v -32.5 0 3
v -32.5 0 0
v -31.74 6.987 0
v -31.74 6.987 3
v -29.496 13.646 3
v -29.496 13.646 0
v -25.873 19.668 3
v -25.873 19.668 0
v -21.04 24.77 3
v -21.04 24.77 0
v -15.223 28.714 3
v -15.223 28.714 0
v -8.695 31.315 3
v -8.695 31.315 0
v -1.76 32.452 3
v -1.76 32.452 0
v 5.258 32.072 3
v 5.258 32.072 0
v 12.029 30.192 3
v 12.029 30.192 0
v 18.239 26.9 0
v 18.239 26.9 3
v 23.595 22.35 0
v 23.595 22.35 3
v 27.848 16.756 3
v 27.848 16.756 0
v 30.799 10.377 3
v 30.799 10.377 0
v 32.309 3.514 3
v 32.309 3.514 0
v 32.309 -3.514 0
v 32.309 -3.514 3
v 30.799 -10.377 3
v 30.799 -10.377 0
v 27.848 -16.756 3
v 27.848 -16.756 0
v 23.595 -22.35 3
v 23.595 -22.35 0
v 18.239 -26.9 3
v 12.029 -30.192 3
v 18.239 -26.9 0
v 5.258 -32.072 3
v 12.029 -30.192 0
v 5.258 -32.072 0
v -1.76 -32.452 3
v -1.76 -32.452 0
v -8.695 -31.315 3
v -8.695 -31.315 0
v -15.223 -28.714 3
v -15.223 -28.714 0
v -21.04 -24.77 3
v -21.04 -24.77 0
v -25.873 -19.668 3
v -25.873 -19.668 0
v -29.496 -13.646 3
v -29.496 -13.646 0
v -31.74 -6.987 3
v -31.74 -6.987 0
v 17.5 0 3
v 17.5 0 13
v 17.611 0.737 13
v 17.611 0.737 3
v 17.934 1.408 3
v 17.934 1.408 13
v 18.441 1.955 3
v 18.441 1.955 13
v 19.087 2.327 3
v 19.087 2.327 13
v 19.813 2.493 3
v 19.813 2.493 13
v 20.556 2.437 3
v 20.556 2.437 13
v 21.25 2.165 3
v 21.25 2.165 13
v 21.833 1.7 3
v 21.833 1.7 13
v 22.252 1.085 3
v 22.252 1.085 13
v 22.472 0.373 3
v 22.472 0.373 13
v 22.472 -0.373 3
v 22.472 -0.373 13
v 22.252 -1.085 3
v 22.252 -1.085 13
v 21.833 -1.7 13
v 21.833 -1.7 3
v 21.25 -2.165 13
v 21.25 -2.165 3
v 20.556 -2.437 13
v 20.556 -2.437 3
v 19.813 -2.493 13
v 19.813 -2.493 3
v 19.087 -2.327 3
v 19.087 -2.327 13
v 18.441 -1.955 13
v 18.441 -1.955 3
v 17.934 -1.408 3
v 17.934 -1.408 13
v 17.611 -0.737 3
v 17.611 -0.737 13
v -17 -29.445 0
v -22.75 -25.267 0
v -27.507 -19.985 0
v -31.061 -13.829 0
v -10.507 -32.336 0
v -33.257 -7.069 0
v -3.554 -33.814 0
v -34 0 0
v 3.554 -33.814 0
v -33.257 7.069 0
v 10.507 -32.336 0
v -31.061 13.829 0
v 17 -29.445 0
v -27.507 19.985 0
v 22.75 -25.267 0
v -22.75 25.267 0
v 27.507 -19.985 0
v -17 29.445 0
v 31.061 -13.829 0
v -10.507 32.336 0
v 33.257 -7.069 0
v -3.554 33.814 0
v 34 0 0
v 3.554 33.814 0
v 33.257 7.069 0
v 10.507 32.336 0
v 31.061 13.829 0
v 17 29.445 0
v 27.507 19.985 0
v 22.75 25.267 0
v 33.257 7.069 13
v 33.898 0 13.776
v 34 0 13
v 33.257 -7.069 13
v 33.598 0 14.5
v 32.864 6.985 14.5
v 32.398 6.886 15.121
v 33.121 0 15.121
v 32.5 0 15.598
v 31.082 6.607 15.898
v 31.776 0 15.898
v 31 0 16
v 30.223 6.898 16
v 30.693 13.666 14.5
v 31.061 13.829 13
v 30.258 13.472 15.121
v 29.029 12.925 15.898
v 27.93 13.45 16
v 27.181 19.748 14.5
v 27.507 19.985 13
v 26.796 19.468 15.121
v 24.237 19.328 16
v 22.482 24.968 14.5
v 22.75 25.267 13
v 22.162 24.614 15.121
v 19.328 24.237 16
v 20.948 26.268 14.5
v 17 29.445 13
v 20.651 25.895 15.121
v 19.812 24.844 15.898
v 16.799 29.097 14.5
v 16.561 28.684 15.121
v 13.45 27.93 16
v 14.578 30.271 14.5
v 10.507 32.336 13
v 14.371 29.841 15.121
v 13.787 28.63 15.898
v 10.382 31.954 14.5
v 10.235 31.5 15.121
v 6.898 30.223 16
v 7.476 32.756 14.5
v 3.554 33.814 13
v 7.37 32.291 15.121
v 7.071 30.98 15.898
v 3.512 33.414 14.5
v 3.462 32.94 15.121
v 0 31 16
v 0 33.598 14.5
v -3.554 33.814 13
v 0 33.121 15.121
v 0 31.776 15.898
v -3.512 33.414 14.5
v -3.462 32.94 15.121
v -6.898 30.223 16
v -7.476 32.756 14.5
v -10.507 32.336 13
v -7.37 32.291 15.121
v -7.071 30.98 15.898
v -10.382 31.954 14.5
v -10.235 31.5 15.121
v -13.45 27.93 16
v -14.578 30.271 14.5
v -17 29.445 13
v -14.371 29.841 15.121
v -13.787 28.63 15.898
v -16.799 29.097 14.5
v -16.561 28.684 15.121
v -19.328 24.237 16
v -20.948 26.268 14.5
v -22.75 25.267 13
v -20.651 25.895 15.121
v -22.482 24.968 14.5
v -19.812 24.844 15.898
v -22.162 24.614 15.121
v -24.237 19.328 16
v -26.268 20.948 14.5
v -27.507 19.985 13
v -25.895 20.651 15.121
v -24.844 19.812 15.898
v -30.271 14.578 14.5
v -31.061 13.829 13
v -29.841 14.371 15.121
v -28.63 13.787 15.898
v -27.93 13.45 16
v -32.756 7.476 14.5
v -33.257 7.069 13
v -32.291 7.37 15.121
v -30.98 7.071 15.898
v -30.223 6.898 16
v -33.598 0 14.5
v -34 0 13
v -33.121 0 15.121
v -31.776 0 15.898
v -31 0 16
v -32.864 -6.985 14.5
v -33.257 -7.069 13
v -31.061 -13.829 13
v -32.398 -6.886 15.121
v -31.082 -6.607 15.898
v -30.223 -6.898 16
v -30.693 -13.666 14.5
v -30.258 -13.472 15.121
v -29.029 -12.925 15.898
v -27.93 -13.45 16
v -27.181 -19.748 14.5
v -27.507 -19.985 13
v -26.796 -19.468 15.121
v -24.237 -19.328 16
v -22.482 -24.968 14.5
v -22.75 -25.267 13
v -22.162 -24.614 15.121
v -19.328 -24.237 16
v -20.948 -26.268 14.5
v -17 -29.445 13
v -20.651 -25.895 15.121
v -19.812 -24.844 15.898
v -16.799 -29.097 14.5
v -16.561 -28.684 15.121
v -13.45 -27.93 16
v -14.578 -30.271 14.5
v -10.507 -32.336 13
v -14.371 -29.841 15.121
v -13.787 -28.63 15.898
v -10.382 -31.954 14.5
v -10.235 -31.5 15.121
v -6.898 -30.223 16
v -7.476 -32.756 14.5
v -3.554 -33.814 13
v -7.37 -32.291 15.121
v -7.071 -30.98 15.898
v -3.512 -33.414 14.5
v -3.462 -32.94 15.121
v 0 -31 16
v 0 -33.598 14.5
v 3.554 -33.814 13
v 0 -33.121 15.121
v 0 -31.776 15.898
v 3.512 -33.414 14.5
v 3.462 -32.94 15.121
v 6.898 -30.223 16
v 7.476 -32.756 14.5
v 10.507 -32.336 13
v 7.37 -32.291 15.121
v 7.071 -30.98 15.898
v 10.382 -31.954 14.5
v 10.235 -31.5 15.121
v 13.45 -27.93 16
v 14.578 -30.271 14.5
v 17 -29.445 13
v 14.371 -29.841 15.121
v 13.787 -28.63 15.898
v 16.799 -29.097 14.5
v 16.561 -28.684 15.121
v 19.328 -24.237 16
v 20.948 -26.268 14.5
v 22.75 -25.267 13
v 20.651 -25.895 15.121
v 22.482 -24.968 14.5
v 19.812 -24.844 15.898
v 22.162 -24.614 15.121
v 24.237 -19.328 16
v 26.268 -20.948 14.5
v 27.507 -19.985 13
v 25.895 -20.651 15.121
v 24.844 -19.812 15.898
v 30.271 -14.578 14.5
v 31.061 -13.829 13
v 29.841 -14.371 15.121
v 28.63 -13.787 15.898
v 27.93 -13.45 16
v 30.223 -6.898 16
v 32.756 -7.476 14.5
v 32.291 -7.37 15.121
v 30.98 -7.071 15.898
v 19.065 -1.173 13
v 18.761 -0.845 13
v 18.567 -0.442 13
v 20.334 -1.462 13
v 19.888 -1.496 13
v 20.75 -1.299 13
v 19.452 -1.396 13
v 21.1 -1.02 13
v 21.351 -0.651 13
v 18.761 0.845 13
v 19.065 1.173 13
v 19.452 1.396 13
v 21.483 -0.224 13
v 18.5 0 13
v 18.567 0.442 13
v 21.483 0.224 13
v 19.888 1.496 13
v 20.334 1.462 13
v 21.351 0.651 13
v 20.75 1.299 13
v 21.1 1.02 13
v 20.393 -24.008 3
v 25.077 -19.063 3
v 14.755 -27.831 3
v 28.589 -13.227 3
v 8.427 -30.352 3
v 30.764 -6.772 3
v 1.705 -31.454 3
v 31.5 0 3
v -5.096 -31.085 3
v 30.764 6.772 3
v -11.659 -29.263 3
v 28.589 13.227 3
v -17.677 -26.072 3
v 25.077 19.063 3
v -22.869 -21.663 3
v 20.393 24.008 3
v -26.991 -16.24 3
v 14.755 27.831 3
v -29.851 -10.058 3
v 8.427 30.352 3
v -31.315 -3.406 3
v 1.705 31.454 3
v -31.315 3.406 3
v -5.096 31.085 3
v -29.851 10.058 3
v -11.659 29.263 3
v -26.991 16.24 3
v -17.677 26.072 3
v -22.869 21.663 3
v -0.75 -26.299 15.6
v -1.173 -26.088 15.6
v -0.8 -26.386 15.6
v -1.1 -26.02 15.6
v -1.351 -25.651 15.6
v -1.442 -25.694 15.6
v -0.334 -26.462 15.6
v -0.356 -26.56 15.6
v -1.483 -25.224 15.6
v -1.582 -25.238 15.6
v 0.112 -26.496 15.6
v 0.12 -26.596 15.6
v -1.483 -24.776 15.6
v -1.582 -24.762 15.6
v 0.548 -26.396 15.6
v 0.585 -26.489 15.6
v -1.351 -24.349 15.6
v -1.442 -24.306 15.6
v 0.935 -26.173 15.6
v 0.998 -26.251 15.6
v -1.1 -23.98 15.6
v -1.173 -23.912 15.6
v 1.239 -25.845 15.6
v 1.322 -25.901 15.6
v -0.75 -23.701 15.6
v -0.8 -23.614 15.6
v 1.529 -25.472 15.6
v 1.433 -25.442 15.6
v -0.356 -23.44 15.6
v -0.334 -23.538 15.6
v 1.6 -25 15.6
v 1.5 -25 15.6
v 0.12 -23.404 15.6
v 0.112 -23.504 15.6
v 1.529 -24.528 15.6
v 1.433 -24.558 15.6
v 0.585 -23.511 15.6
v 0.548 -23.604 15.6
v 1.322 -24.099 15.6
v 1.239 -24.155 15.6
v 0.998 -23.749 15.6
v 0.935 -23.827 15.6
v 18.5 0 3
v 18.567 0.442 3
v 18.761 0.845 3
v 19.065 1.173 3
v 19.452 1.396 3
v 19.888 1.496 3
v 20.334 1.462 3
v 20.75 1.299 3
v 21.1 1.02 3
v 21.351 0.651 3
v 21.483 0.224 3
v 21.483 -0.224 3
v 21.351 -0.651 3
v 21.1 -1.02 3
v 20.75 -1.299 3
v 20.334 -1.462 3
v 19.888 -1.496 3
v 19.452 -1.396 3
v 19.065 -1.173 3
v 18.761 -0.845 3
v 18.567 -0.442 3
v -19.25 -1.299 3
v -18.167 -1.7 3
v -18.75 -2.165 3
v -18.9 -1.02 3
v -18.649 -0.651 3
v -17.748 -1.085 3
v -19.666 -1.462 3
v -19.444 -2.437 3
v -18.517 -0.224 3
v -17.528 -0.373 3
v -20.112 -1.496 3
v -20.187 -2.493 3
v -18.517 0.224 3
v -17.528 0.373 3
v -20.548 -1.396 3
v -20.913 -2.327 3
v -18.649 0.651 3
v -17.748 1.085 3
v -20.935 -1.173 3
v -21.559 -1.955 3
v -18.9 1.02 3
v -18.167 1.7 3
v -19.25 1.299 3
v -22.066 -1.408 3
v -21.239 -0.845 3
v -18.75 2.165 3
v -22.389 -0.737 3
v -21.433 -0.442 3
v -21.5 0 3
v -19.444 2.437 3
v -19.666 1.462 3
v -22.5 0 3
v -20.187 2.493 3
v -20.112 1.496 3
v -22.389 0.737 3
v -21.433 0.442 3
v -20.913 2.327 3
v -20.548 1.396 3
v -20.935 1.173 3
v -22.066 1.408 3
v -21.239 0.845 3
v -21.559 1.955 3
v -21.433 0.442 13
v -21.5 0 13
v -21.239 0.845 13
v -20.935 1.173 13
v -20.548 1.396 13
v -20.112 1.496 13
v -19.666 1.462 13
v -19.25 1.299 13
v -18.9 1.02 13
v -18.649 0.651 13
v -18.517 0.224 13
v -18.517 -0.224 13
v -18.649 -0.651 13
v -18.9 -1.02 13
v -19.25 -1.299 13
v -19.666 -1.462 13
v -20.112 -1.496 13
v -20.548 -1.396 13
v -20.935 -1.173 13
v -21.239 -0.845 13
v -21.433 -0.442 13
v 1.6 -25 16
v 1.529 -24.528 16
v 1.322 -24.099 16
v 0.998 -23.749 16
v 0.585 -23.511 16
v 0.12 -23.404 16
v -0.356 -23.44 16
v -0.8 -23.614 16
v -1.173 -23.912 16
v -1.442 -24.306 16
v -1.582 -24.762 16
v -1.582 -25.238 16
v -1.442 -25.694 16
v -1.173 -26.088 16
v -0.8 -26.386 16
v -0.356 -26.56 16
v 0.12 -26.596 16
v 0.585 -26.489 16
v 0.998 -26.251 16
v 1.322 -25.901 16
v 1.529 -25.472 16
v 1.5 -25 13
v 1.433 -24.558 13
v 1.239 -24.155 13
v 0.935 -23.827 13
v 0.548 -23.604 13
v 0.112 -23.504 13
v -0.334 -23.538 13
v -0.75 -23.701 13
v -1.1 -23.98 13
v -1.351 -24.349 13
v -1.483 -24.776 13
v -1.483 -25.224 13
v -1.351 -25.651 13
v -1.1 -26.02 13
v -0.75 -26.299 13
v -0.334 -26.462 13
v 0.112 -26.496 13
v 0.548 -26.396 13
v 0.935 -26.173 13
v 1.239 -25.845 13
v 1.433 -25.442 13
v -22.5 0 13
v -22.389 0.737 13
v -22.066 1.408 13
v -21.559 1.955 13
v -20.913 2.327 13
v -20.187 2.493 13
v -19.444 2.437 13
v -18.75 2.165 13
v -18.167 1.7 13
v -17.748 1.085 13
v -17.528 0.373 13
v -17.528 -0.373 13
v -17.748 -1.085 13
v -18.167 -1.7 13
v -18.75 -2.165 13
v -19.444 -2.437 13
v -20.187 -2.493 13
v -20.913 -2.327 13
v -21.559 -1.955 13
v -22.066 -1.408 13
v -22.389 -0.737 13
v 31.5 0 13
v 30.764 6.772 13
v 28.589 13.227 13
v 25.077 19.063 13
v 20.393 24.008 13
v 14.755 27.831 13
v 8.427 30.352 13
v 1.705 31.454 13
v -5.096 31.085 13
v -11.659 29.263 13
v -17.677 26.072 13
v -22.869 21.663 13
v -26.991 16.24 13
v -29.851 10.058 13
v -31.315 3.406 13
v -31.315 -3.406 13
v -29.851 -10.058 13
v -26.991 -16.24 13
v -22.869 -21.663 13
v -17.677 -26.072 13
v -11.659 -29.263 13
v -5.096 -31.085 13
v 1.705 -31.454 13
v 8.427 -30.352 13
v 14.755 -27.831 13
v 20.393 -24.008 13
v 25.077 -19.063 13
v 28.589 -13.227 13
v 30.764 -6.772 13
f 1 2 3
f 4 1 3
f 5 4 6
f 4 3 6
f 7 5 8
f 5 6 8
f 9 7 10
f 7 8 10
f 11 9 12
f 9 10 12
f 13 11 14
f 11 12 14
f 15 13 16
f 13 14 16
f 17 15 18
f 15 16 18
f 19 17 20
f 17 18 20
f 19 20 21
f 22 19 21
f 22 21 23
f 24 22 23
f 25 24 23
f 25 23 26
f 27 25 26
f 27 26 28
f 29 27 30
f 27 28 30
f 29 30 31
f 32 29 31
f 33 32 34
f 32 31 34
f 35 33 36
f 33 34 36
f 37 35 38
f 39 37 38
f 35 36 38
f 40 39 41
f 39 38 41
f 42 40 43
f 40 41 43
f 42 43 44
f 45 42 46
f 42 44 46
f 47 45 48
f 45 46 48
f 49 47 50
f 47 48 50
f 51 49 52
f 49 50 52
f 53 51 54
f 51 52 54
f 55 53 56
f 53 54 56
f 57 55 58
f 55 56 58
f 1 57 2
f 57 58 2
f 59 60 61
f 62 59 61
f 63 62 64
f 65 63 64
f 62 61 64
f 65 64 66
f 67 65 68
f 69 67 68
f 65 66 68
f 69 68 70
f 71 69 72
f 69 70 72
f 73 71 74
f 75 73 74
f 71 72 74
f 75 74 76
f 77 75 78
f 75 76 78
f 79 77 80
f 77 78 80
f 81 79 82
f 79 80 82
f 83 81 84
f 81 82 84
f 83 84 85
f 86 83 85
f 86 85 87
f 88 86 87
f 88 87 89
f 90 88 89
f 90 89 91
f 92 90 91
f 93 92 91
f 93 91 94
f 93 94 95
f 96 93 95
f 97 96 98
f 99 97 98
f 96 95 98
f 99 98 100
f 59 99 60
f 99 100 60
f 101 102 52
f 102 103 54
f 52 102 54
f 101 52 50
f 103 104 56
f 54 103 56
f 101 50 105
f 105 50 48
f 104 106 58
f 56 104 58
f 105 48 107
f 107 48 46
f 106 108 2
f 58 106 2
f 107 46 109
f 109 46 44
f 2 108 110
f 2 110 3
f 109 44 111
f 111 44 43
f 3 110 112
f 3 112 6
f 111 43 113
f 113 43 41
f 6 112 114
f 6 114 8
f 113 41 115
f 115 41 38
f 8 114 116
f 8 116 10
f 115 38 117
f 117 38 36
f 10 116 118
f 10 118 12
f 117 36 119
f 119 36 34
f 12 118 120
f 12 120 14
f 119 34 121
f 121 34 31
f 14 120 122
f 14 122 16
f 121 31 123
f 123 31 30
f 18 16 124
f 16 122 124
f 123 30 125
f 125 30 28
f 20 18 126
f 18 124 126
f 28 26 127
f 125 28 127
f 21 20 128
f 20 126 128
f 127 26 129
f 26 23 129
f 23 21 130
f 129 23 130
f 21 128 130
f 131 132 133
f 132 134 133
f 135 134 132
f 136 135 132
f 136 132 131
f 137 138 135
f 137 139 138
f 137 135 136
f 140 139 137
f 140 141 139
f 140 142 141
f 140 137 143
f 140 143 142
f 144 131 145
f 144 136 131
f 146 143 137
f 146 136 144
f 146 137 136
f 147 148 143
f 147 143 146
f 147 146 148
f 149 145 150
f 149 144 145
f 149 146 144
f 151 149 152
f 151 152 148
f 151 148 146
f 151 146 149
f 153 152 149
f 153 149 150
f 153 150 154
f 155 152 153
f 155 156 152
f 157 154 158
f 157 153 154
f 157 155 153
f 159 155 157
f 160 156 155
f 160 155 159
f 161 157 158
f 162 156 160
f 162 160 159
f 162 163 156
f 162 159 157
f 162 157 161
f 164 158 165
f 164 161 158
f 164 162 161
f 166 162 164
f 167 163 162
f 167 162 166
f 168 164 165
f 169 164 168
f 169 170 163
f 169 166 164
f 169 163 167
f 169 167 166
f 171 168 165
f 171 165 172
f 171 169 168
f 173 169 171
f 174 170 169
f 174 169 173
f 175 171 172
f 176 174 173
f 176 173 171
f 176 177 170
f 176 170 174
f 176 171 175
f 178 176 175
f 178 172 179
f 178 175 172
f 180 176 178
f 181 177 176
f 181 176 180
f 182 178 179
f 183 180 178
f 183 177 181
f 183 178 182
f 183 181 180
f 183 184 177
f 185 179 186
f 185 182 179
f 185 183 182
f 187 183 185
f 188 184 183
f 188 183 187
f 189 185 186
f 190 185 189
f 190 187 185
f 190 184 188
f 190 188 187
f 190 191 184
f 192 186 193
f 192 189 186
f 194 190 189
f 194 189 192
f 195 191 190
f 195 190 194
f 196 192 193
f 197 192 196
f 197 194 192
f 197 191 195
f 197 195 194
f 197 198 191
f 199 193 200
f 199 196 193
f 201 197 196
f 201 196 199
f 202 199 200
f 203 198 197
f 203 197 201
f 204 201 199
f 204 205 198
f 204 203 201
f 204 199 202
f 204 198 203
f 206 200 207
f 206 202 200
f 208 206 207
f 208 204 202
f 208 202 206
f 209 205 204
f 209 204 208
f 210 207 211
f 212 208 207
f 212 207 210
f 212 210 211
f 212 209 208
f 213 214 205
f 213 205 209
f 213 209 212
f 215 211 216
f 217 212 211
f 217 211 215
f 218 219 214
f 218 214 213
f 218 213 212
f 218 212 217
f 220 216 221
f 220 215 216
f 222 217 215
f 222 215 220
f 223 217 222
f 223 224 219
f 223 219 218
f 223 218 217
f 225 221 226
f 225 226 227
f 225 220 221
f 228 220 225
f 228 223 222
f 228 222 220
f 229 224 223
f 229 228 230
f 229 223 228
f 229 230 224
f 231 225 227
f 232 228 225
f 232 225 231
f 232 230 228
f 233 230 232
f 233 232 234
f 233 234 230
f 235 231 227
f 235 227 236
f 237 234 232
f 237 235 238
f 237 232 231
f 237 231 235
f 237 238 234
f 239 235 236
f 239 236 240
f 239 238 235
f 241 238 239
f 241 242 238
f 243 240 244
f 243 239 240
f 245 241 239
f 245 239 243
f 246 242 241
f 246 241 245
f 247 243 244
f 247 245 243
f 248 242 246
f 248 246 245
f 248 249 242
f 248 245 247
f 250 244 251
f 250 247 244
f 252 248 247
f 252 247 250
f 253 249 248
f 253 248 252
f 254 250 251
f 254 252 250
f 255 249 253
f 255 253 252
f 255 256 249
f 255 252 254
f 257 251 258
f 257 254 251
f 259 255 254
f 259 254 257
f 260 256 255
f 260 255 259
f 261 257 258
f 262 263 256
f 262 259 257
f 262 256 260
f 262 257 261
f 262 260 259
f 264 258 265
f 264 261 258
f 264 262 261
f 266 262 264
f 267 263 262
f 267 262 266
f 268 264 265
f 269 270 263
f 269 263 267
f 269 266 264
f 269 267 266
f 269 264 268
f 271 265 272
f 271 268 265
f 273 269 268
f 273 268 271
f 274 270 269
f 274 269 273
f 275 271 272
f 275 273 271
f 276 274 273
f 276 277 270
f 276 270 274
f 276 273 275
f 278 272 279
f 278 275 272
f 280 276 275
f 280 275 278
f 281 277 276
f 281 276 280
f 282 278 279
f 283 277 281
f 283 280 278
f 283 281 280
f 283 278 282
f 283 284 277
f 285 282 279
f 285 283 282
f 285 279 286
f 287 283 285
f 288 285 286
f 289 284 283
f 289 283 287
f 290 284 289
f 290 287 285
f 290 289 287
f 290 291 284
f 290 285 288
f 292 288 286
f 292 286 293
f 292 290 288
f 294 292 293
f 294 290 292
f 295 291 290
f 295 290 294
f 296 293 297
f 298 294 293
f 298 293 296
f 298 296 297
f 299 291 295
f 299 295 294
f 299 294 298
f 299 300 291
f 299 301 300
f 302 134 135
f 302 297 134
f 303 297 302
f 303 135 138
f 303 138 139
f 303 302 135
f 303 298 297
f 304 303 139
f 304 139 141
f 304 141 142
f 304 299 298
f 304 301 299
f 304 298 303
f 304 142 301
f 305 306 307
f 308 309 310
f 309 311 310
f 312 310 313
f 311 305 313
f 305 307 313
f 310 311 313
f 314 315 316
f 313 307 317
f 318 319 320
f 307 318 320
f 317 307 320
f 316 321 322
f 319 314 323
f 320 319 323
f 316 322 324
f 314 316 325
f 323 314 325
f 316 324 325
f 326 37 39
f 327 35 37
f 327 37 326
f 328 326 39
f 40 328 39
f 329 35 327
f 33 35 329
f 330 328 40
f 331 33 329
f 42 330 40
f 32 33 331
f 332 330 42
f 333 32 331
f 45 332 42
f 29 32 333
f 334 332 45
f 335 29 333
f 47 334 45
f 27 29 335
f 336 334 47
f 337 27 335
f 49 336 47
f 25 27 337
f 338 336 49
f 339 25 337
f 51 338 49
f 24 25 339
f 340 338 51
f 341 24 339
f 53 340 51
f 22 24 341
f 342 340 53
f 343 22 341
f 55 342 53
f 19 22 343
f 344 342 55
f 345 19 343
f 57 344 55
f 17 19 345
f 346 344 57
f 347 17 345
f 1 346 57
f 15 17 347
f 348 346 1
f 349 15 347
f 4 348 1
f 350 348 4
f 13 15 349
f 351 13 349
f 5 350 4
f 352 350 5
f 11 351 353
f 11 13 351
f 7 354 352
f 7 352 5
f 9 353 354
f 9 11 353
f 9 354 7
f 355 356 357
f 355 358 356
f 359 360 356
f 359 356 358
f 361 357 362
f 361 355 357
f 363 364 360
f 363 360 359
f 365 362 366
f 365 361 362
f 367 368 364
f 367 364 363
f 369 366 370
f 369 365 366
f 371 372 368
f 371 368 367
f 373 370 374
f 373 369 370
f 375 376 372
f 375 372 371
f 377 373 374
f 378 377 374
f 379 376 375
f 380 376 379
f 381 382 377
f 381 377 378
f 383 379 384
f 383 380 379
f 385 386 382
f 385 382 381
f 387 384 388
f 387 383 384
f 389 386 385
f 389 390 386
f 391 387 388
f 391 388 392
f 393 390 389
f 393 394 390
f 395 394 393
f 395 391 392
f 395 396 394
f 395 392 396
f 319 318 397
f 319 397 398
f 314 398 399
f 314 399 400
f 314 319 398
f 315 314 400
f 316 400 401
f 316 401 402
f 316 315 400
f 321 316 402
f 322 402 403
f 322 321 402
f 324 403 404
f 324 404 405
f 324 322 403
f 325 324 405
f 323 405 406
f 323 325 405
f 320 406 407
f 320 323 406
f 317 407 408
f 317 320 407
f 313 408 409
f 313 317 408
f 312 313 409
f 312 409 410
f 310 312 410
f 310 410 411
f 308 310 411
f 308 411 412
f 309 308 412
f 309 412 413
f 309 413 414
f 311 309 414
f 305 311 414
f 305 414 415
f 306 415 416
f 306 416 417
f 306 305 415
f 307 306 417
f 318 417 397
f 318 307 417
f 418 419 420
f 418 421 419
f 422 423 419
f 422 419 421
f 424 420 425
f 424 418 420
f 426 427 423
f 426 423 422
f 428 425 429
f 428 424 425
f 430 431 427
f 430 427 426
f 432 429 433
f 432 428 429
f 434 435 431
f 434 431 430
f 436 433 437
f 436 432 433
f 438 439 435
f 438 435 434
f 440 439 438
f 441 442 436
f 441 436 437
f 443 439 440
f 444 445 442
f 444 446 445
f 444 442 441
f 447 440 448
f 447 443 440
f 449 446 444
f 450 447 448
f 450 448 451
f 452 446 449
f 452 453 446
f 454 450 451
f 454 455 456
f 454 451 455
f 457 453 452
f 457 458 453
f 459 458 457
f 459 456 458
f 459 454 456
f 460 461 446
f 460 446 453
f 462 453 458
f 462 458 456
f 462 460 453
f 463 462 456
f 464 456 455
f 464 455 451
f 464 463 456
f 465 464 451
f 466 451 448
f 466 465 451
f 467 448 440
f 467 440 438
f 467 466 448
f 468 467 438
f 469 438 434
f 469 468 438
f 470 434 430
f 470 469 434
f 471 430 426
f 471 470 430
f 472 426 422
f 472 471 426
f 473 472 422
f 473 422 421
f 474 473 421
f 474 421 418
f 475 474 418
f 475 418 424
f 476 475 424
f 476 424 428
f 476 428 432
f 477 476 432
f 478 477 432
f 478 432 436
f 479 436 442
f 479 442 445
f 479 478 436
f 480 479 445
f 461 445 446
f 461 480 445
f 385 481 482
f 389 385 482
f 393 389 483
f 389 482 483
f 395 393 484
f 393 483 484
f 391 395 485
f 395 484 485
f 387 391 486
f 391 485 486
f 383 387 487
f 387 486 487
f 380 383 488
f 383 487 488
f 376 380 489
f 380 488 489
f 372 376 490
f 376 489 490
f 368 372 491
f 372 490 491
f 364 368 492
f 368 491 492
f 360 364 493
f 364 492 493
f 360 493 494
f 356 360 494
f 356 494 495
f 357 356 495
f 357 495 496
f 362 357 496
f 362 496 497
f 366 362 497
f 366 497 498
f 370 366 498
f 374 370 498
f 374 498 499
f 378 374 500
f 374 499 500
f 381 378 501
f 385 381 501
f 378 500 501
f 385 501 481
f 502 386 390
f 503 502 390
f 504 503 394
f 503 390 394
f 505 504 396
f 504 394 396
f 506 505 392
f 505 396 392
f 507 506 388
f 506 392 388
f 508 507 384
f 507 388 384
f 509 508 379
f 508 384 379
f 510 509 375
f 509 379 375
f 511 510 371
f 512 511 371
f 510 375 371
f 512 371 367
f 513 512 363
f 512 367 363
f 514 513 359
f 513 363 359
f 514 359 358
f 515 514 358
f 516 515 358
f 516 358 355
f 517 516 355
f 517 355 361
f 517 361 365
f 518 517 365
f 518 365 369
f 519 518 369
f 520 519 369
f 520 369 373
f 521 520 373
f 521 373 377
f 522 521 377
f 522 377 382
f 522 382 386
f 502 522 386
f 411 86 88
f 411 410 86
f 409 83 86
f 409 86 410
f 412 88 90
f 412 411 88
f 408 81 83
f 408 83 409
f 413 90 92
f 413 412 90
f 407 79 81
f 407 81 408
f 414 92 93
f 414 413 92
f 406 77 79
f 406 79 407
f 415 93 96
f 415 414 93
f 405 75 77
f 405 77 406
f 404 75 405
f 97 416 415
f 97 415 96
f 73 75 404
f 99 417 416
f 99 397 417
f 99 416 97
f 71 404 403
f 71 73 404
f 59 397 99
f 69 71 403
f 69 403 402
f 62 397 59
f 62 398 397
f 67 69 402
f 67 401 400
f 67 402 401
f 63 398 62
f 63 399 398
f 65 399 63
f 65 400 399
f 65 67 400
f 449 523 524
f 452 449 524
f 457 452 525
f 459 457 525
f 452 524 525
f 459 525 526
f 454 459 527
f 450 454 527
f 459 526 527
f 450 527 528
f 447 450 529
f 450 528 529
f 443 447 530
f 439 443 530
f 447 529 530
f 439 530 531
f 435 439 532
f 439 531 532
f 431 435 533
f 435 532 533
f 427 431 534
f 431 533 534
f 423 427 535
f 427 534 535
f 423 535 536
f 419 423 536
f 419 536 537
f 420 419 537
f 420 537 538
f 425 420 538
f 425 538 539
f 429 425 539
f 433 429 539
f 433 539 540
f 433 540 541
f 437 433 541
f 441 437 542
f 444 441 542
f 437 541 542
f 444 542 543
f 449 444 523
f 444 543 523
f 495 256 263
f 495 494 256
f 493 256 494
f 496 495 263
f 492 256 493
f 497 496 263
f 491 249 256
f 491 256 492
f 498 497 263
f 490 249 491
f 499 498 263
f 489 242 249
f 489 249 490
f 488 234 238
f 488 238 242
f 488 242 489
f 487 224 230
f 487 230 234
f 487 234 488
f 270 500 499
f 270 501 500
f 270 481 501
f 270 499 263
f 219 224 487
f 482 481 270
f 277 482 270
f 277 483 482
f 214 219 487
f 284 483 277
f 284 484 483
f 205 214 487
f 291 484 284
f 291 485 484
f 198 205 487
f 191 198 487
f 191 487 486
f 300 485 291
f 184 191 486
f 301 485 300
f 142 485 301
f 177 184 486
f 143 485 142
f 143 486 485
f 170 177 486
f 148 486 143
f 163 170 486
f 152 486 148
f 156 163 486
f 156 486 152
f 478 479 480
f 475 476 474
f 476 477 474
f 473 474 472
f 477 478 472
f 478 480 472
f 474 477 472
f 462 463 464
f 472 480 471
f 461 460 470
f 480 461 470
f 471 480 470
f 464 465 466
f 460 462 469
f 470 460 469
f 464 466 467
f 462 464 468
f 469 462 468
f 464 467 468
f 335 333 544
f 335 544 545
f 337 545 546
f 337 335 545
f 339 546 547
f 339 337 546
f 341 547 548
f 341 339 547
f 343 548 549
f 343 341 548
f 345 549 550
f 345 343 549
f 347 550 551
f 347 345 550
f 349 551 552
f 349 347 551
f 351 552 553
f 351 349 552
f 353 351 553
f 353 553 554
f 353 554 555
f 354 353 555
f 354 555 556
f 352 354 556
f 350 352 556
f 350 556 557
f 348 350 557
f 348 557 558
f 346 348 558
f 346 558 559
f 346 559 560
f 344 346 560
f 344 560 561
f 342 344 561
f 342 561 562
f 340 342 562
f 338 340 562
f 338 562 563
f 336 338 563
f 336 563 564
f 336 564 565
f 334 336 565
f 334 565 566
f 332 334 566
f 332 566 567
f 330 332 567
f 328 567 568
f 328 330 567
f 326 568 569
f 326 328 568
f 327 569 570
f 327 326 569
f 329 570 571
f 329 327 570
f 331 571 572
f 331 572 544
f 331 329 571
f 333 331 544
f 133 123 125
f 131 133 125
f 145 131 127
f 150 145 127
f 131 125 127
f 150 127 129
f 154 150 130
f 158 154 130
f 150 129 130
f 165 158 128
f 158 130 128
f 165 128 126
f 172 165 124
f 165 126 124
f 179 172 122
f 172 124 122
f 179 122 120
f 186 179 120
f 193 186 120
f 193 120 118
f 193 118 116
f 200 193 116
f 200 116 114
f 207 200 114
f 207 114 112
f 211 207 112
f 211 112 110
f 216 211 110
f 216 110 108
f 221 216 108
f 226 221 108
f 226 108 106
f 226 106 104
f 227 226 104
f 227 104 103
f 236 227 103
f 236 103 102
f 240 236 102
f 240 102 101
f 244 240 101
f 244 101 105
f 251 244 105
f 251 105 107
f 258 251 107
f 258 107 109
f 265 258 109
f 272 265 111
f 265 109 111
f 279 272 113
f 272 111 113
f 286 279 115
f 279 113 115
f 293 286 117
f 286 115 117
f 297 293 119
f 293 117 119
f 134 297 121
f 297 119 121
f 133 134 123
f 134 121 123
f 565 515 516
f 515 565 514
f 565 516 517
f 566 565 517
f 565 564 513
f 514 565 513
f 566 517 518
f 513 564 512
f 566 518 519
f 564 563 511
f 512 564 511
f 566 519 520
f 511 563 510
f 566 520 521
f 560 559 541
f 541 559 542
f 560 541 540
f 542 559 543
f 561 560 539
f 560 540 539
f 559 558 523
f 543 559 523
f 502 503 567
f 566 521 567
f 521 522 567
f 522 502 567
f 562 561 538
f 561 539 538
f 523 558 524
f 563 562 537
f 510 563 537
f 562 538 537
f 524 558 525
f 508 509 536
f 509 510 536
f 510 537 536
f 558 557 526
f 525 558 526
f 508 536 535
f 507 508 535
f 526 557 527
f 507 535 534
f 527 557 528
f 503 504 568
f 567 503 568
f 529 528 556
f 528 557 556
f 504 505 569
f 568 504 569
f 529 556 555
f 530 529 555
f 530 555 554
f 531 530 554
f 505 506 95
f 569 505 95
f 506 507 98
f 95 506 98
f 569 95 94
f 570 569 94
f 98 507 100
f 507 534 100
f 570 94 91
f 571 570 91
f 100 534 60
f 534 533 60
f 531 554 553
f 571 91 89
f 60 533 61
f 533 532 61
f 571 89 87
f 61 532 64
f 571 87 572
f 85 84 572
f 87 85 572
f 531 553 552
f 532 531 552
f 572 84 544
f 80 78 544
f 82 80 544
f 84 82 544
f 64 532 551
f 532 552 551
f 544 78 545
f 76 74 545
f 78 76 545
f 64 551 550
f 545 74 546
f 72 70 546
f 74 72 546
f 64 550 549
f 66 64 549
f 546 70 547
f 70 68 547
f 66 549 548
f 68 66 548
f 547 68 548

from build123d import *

# Parameters (mm, degrees)
SKETCH1_R           = 34
SKETCH1_R_2         = 31.5
BOSS_EXTRUDE1_DEPTH = 13
SKETCH2_R           = 34
BOSS_EXTRUDE2_DEPTH = 3
FILLET1_R           = 3
SKETCH3_R           = 2.5
SKETCH3_R_2         = 1.5
BOSS_EXTRUDE3_DEPTH = 10
SKETCH5_R           = 32.5
SKETCH5_R_2         = 31.5
CUT_EXTRUDE1_DEPTH  = 3
SKETCH6_R           = 1.6
CUT_EXTRUDE2_DEPTH  = 0.4
SKETCH7_R           = 1.5
CUT_EXTRUDE3_DEPTH  = 16.6


with BuildPart() as part:
    # Sketch1 → Boss-Extrude1 (new body)
    with BuildSketch(Plane.XY):
        Circle(SKETCH1_R)
        Circle(SKETCH1_R_2, mode=Mode.SUBTRACT)
    extrude(amount=BOSS_EXTRUDE1_DEPTH)

    # Sketch2 → Boss-Extrude2 (add)
    with BuildSketch(Plane.XY.offset(13)):
        Circle(SKETCH2_R)
    extrude(amount=BOSS_EXTRUDE2_DEPTH)

    # Fillet1
    fillet1_edges = [part.edges().sort_by_distance(p)[0] for p in [
        (-34, 0, 16),
    ]]
    fillet(fillet1_edges, radius=FILLET1_R)

    # Sketch3 → Boss-Extrude3 (add)
    with BuildSketch(Plane(origin=(0, 0, 13), x_dir=(-1, 0, 0), z_dir=(0, 0, -1))):
        with Locations((-20, 0)):
            Circle(SKETCH3_R)
        with Locations((-20, 0)):
            Circle(SKETCH3_R_2, mode=Mode.SUBTRACT)
        with Locations((20, 0)):
            Circle(SKETCH3_R)
        with Locations((20, 0)):
            Circle(SKETCH3_R_2, mode=Mode.SUBTRACT)
    extrude(amount=BOSS_EXTRUDE3_DEPTH)

    # Sketch5 → Cut-Extrude1 (cut)
    with BuildSketch(Plane(origin=(0, 0, 0), x_dir=(-1, 0, 0), z_dir=(0, 0, -1))):
        Circle(SKETCH5_R)
        Circle(SKETCH5_R_2, mode=Mode.SUBTRACT)
    extrude(amount=-CUT_EXTRUDE1_DEPTH, mode=Mode.SUBTRACT)

    # Sketch6 → Cut-Extrude2 (cut)
    with BuildSketch(Plane.XY.offset(16)):
        with Locations((0, -25)):
            Circle(SKETCH6_R)
    extrude(amount=-CUT_EXTRUDE2_DEPTH, mode=Mode.SUBTRACT)

    # Sketch7 → Cut-Extrude3 (cut, through all)
    with BuildSketch(Plane.XY.offset(15.6)):
        with Locations((0, -25)):
            Circle(SKETCH7_R)
    extrude(amount=-CUT_EXTRUDE3_DEPTH, mode=Mode.SUBTRACT)


solid = part.part
